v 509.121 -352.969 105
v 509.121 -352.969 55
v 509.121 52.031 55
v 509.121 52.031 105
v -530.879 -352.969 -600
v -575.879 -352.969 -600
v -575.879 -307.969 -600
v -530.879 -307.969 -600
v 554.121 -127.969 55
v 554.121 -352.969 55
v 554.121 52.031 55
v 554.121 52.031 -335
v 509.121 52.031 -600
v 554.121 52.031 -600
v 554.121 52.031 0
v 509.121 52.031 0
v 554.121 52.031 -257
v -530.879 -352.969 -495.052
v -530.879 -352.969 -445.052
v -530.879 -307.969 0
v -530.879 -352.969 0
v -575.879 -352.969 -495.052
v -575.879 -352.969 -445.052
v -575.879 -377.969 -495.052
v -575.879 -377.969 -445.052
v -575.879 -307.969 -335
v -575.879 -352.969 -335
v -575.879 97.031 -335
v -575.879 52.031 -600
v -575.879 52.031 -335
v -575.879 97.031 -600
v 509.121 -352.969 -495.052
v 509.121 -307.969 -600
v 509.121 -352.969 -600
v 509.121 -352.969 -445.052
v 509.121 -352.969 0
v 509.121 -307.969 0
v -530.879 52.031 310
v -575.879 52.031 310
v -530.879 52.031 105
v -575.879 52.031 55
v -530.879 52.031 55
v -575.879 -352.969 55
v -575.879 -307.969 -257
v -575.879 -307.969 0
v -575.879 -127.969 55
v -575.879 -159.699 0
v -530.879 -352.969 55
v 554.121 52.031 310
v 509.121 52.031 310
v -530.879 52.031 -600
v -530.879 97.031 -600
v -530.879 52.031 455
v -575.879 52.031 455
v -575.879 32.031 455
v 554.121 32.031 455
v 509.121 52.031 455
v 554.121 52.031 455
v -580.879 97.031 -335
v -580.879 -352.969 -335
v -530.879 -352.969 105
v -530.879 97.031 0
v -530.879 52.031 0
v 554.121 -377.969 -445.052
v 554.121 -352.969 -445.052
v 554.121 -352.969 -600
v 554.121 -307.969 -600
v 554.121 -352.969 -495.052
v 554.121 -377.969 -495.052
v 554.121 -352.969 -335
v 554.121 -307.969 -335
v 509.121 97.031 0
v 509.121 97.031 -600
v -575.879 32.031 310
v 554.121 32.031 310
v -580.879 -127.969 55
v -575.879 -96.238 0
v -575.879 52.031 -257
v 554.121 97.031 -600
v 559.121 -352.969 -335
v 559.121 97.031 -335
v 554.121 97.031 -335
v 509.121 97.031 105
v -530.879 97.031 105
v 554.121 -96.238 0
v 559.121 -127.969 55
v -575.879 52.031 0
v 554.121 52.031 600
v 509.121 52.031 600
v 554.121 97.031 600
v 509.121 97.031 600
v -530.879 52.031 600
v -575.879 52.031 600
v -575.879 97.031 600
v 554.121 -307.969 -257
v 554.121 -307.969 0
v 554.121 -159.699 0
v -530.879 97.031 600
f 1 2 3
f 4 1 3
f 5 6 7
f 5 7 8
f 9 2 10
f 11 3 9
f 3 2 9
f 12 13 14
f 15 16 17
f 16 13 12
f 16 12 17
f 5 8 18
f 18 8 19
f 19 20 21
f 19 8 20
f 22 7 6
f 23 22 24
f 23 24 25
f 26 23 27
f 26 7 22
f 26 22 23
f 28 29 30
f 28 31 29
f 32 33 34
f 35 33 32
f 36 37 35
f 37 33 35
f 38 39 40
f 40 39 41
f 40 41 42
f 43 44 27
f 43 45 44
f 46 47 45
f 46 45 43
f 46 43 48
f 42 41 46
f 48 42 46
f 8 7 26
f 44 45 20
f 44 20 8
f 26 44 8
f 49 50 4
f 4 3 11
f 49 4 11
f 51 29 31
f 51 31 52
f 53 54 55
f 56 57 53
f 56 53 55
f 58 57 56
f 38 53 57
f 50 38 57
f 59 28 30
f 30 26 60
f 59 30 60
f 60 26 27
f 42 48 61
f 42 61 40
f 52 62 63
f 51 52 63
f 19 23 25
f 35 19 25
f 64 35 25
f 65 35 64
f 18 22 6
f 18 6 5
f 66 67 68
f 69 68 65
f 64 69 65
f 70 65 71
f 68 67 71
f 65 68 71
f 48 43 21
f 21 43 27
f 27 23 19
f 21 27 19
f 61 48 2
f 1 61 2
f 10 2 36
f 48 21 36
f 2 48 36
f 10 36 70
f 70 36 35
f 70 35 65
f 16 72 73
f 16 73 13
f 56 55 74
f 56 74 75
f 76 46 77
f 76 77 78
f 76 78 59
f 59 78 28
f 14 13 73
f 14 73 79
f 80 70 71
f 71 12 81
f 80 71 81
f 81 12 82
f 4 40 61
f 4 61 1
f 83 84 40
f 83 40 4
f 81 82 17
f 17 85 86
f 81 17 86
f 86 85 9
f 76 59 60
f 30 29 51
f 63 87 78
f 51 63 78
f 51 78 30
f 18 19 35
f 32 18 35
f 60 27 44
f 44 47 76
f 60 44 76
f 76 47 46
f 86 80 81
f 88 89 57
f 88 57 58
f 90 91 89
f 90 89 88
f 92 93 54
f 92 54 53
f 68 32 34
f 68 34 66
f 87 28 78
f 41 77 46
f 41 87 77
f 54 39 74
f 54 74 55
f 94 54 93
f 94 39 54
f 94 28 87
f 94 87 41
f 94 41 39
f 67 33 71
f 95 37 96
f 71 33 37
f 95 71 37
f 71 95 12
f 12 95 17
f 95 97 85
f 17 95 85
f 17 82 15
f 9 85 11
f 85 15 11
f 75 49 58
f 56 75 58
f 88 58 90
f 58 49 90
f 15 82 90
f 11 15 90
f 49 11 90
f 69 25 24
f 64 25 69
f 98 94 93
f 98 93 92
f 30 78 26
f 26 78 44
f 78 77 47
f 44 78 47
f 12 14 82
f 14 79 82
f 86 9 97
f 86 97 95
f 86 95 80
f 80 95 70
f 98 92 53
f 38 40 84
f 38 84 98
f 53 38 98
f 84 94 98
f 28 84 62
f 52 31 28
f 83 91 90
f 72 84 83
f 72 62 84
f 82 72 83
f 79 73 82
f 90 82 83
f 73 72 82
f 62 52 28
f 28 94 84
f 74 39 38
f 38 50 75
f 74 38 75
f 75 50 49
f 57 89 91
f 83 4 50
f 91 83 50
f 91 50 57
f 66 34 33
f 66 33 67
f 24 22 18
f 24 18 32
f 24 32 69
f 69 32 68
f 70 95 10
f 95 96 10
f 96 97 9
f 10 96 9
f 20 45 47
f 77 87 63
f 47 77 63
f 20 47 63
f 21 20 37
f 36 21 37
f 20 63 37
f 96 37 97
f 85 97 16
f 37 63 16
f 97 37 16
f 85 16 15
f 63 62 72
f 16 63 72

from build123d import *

# Parameters (mm, degrees)
F0_W      = 1130
F0_H      = 450
F1_DEPTH  = 55
F2_W      = 45
F2_H      = 45
F3_DEPTH  = 600
F4_W      = 45
F4_H      = 45
F5_DEPTH  = 600
F6_W      = 45
F6_H      = 45
F7_DEPTH  = 600
F8_W      = 45
F8_H      = 45
F9_DEPTH  = 600
F10_W     = 45
F10_H     = 45
F11_DEPTH = 545
F12_W     = 45
F12_H     = 45
F13_DEPTH = 545
F14_W     = 1130
F14_H     = 145
F15_DEPTH = 20
F16_W     = 1130
F16_H     = 50
F17_DEPTH = 25
F18_W     = 1040
F18_H     = 450
F19_DEPTH = 50
F21_DEPTH = 5
F23_DEPTH = 5


with BuildPart() as f1:
    # F0 (on Top) → F1 (new body)
    with BuildSketch(Plane.XY):
        with Locations((-10.878954, -127.968649)):
            Rectangle(F0_W, F0_H)
    extrude(amount=F1_DEPTH)

    # F2 (on face) → F3 (join)
    with BuildSketch(Plane(origin=(0, 0, 0), x_dir=(1, 0, 0), z_dir=(0, 0, -1))):
        with Locations((531.621046, -74.531351)):
            Rectangle(F2_W, F2_H)
    extrude(amount=F3_DEPTH)

    # F4 (on face) → F5 (join)
    with BuildSketch(Plane(origin=(0, 0, 0), x_dir=(1, 0, 0), z_dir=(0, 0, -1))):
        with Locations((-553.378954, -74.531351)):
            Rectangle(F4_W, F4_H)
    extrude(amount=F5_DEPTH)

    # F6 (on face) → F7 (join)
    with BuildSketch(Plane(origin=(0, 0, 0), x_dir=(1, 0, 0), z_dir=(0, 0, -1))):
        with Locations((531.621046, 330.468649)):
            Rectangle(F6_W, F6_H)
    extrude(amount=F7_DEPTH)

    # F8 (on face) → F9 (join)
    with BuildSketch(Plane(origin=(0, 0, 0), x_dir=(1, 0, 0), z_dir=(0, 0, -1))):
        with Locations((-553.378954, 330.468649)):
            Rectangle(F8_W, F8_H)
    extrude(amount=F9_DEPTH)

    # F10 (on face) → F11 (join)
    with BuildSketch(Plane.XY.offset(55)):
        with Locations((531.621046, 74.531351)):
            Rectangle(F10_W, F10_H)
    extrude(amount=F11_DEPTH)

    # F12 (on face) → F13 (join)
    with BuildSketch(Plane.XY.offset(55)):
        with Locations((-553.378954, 74.531351)):
            Rectangle(F12_W, F12_H)
    extrude(amount=F13_DEPTH)

    # F14 (on face) → F15 (join)
    with BuildSketch(Plane.XZ.offset(-52.031351)):
        with Locations((-10.878954, 382.5)):
            Rectangle(F14_W, F14_H)
    extrude(amount=F15_DEPTH)

    # F16 (on face) → F17 (join)
    with BuildSketch(Plane.XZ.offset(352.968649)):
        with Locations((-10.878954, -470.051563)):
            Rectangle(F16_W, F16_H)
    extrude(amount=F17_DEPTH)

    # F18 (on face) → F19 (join)
    with BuildSketch(Plane.XY.offset(55)):
        with Locations((-10.878954, -127.968649)):
            Rectangle(F18_W, F18_H)
    extrude(amount=F19_DEPTH)

    # F20 (on face) → F21 (join)
    with BuildSketch(Plane.YZ.offset(554.121046)):
        Polygon((-127.968649, 55), (-352.968649, -335), (97.031351, -335), align=None)
    extrude(amount=F21_DEPTH)

    # F22 (on face) → F23 (join)
    with BuildSketch(Plane(origin=(-575.878954, 0, 0), x_dir=(0, -1, 0), z_dir=(-1, 0, 0))):
        Polygon((-97.031351, -335), (352.968649, -335), (127.968649, 55), align=None)
    extrude(amount=F23_DEPTH)


solid = f1.part
